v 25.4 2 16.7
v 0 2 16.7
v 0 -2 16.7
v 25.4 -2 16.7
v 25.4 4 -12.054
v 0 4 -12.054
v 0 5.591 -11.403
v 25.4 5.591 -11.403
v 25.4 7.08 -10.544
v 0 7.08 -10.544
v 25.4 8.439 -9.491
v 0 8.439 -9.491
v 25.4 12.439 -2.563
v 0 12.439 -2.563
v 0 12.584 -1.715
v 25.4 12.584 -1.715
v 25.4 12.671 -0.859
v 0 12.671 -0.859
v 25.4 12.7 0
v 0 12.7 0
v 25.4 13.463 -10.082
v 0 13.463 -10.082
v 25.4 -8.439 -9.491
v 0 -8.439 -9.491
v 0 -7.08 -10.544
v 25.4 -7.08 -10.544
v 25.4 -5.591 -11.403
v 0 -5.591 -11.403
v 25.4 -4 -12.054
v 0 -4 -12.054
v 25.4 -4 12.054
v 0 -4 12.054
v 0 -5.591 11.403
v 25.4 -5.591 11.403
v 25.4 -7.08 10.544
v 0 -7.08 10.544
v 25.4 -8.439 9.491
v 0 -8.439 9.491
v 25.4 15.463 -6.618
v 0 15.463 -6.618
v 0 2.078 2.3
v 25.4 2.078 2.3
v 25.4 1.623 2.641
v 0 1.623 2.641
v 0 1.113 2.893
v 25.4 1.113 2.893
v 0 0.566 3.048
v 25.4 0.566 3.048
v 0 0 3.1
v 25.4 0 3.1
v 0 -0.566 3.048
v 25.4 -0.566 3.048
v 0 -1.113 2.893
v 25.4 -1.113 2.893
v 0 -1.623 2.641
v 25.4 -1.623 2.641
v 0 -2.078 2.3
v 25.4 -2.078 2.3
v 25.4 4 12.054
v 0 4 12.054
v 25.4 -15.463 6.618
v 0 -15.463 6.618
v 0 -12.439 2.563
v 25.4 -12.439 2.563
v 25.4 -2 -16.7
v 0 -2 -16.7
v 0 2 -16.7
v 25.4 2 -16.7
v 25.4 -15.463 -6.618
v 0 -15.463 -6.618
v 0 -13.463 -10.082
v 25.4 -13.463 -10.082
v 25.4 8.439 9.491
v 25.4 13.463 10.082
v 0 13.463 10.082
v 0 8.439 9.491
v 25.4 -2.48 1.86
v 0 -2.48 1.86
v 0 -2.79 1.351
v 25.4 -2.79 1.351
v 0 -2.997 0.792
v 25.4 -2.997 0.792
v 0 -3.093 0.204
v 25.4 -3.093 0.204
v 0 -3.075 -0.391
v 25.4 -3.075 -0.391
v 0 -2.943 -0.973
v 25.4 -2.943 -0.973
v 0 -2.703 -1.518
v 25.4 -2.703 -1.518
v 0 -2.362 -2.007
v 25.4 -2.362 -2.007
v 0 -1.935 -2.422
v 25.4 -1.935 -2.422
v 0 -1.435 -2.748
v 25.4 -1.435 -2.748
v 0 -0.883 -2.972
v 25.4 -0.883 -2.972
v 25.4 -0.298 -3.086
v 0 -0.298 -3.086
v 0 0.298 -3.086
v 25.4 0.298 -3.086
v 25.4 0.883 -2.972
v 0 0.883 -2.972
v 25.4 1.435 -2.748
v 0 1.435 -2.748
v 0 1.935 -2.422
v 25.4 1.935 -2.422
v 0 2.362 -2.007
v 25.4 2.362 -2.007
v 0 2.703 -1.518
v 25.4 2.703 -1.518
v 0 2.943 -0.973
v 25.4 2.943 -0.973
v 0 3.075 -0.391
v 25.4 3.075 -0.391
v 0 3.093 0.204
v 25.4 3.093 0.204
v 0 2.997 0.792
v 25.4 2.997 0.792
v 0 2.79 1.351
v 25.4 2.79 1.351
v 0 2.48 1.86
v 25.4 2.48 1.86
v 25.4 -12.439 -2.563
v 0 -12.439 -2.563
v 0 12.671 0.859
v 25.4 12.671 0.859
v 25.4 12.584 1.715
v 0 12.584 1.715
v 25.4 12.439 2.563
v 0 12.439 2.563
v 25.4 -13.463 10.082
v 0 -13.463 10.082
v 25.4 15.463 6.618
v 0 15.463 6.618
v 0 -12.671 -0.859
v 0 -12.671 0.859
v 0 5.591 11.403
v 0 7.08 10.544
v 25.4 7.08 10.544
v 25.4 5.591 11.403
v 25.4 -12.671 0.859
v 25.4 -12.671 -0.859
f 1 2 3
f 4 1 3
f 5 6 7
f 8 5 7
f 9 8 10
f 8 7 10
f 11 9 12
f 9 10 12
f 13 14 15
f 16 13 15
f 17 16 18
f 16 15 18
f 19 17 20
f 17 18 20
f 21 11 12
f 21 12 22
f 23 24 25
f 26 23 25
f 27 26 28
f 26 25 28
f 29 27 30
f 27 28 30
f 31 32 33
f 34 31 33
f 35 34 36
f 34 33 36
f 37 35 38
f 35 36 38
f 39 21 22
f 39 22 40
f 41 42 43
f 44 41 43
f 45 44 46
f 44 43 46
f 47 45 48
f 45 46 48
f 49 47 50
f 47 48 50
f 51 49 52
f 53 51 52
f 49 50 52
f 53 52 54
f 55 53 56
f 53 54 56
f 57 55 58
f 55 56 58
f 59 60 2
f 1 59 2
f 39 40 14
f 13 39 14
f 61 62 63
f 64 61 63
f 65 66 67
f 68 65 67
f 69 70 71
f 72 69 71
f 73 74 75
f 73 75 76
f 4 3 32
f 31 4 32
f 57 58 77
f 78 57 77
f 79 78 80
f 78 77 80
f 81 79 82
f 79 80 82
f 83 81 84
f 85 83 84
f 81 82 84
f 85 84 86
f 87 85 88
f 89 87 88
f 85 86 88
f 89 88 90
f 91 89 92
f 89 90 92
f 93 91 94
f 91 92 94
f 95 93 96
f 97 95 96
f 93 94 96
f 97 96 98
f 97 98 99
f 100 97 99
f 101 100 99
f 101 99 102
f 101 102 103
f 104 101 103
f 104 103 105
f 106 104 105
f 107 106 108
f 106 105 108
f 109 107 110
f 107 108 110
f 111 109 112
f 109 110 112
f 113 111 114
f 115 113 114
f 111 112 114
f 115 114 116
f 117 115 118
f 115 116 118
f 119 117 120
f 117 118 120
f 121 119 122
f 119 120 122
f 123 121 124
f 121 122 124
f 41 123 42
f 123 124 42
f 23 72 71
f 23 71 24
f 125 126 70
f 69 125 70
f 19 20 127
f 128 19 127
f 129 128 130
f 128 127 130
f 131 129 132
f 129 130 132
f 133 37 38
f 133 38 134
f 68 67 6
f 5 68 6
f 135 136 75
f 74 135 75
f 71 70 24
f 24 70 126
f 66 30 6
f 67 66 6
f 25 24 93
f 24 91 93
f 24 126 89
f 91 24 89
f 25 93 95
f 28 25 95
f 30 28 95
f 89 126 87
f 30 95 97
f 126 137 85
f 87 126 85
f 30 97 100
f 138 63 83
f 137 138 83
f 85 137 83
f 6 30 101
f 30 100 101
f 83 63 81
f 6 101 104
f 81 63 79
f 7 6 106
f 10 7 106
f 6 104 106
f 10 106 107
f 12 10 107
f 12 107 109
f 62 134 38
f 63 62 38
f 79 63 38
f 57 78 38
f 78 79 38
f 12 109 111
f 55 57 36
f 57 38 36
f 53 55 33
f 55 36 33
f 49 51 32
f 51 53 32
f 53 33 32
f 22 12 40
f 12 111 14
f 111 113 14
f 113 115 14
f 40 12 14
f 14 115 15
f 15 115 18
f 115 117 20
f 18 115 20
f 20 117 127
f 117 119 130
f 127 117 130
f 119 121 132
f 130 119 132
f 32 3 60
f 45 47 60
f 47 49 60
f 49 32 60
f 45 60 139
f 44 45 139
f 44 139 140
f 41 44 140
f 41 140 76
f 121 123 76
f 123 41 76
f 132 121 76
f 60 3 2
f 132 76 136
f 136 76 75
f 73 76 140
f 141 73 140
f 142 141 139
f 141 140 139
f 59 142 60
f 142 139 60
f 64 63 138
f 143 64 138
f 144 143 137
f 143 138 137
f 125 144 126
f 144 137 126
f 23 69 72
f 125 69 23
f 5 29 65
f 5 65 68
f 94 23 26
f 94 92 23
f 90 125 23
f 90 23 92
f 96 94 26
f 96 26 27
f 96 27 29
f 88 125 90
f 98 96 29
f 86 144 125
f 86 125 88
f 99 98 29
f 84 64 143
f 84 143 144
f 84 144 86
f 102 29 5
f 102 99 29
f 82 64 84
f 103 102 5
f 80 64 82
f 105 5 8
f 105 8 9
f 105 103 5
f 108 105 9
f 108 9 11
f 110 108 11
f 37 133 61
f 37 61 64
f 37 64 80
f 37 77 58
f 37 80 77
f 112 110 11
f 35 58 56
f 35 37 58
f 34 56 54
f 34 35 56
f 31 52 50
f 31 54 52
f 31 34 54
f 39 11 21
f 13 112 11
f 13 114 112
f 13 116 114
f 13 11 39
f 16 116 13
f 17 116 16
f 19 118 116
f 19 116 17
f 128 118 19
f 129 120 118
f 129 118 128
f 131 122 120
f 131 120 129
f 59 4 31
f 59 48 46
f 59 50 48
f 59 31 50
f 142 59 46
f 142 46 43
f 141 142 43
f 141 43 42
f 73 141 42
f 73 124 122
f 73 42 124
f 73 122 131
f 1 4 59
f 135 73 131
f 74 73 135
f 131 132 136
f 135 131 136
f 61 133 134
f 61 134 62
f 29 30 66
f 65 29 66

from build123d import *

# Parameters (mm, degrees)
F1_DEPTH = 25.4
F3_DEPTH = 25.4


with BuildPart() as f1:
    # F0 (on Right) → F1 (new body)
    with BuildSketch(Plane.YZ):
        with BuildLine():
            ThreePointArc((12.43875, -2.562713), (12.634519, -1.287998), (12.7, 0))
            ThreePointArc((12.7, 0), (12.634519, 1.287998), (12.43875, 2.562713))
            ThreePointArc((12.43875, 2.562713), (10.998523, 6.35), (8.43875, 9.490917))
            ThreePointArc((8.43875, 9.490917), (6.35, 10.998523), (4, 12.05363))
            ThreePointArc((4, 12.05363), (0, 12.7), (-4, 12.05363))
            ThreePointArc((-4, 12.05363), (-6.35, 10.998523), (-8.43875, 9.490917))
            ThreePointArc((-8.43875, 9.490917), (-10.998523, 6.35), (-12.43875, 2.562713))
            ThreePointArc((-12.43875, 2.562713), (-12.7, 0), (-12.43875, -2.562713))
            ThreePointArc((-12.43875, -2.562713), (-10.998523, -6.35), (-8.43875, -9.490917))
            ThreePointArc((-8.43875, -9.490917), (-6.35, -10.998523), (-4, -12.05363))
            ThreePointArc((-4, -12.05363), (0, -12.7), (4, -12.05363))
            ThreePointArc((4, -12.05363), (6.35, -10.998523), (8.43875, -9.490917))
            ThreePointArc((8.43875, -9.490917), (10.998523, -6.35), (12.43875, -2.562713))
        make_face()
        with BuildLine():
            ThreePointArc((8.43875, 9.490917), (10.998523, 6.35), (12.43875, 2.562713))
            Line((12.43875, 2.562713), (15.462624, 6.617949))
            Line((15.462624, 6.617949), (14.462624, 8.35))
            Line((14.462624, 8.35), (13.462624, 10.082051))
            Line((13.462624, 10.082051), (8.43875, 9.490917))
        make_face()
        with BuildLine():
            Line((15.462624, -6.617949), (12.43875, -2.562713))
            ThreePointArc((12.43875, -2.562713), (10.998523, -6.35), (8.43875, -9.490917))
            Line((8.43875, -9.490917), (13.462624, -10.082051))
            Line((13.462624, -10.082051), (14.462624, -8.35))
            Line((14.462624, -8.35), (15.462624, -6.617949))
        make_face()
        with BuildLine():
            ThreePointArc((-4, 12.05363), (0, 12.7), (4, 12.05363))
            Line((4, 12.05363), (2, 16.7))
            Line((2, 16.7), (0, 16.7))
            Line((0, 16.7), (-2, 16.7))
            Line((-2, 16.7), (-4, 12.05363))
        make_face()
        with BuildLine():
            Line((2, -16.7), (4, -12.05363))
            ThreePointArc((4, -12.05363), (0, -12.7), (-4, -12.05363))
            Line((-4, -12.05363), (-2, -16.7))
            Line((-2, -16.7), (0, -16.7))
            Line((0, -16.7), (2, -16.7))
        make_face()
        with BuildLine():
            ThreePointArc((-12.43875, 2.562713), (-10.998523, 6.35), (-8.43875, 9.490917))
            Line((-8.43875, 9.490917), (-13.462624, 10.082051))
            Line((-13.462624, 10.082051), (-14.462624, 8.35))
            Line((-14.462624, 8.35), (-15.462624, 6.617949))
            Line((-15.462624, 6.617949), (-12.43875, 2.562713))
        make_face()
        with BuildLine():
            Line((-13.462624, -10.082051), (-8.43875, -9.490917))
            ThreePointArc((-8.43875, -9.490917), (-10.998523, -6.35), (-12.43875, -2.562713))
            Line((-12.43875, -2.562713), (-15.462624, -6.617949))
            Line((-15.462624, -6.617949), (-14.462624, -8.35))
            Line((-14.462624, -8.35), (-13.462624, -10.082051))
        make_face()
    extrude(amount=F1_DEPTH)

    # F2 (on face) → F3 (cut)
    with BuildSketch(Plane.YZ.offset(25.4)):
        with BuildLine():
            ThreePointArc((2.077989, 2.300426), (0, 3.1), (-2.077989, 2.300426))
            ThreePointArc((-2.077989, 2.300426), (0, -3.1), (2.077989, 2.300426))
        make_face()
    extrude(amount=-F3_DEPTH, mode=Mode.SUBTRACT)


solid = f1.part
